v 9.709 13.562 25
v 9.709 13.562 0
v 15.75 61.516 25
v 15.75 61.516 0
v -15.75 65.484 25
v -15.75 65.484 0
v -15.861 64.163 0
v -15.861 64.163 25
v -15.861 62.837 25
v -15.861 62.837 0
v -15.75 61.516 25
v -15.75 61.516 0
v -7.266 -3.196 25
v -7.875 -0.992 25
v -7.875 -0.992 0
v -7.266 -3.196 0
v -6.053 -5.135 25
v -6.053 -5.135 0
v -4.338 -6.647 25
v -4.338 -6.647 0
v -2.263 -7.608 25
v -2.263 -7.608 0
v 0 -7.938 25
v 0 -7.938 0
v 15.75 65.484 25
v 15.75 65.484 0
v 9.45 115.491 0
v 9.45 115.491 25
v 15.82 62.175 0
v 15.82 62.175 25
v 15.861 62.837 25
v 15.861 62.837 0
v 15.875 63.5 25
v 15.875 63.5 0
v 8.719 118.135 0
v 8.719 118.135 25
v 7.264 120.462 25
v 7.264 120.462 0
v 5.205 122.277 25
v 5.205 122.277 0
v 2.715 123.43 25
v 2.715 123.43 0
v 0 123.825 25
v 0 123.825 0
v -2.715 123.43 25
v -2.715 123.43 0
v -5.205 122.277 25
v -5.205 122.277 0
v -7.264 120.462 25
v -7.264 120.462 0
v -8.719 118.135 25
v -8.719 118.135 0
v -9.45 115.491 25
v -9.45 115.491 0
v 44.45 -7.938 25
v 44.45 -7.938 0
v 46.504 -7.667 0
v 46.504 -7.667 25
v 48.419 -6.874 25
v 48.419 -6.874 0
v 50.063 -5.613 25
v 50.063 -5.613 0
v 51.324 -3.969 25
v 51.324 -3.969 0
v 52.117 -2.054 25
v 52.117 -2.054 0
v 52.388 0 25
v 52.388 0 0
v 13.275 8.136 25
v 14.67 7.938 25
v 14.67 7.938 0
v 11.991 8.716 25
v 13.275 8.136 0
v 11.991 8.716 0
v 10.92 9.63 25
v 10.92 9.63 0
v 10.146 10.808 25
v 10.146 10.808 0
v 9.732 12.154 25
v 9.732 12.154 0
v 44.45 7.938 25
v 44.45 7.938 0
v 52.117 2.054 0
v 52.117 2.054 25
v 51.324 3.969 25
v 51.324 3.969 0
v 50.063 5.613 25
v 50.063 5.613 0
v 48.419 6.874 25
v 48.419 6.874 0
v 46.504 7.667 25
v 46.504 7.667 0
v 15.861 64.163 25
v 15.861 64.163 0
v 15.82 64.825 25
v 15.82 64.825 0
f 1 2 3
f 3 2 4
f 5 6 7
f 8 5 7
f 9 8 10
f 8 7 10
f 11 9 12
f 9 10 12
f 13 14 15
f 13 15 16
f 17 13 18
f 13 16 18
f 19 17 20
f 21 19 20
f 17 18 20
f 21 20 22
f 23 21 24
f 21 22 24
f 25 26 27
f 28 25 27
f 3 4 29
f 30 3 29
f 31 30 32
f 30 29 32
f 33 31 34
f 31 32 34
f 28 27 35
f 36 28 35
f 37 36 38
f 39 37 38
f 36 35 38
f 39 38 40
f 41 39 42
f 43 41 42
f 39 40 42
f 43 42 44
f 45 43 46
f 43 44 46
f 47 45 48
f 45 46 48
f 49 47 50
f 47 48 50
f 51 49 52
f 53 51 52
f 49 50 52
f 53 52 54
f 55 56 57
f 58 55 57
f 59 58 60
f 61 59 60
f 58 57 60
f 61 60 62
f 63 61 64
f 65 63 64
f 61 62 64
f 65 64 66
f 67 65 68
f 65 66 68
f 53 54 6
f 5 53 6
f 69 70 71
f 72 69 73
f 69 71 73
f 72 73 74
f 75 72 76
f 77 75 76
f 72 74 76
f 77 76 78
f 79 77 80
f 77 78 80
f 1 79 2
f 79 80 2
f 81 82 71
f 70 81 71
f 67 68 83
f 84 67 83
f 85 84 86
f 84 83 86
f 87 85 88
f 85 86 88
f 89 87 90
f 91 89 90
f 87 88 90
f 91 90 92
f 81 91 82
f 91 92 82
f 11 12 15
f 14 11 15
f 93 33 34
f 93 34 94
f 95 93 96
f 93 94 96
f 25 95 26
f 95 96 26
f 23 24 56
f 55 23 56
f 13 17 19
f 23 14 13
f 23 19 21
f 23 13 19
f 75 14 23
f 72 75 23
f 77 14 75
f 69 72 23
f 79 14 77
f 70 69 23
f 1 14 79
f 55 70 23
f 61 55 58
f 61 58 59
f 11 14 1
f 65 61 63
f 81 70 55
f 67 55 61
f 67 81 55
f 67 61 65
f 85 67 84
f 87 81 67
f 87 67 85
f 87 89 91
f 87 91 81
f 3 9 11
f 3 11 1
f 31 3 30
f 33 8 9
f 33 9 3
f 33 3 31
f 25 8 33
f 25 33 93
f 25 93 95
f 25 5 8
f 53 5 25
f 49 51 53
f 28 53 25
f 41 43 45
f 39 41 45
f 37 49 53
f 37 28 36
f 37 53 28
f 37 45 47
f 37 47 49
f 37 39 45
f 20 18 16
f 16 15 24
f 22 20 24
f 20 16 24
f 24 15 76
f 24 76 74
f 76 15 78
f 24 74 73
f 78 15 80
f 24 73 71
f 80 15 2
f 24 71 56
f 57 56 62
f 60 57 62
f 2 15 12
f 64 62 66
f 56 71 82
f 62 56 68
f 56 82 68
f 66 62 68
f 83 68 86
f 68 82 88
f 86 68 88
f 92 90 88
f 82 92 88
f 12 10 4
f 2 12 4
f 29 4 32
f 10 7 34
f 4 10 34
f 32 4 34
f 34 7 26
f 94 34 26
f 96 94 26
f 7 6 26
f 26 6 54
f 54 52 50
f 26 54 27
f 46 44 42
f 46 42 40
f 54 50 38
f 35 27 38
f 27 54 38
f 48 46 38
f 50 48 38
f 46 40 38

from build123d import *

# Parameters (mm, degrees)
F1_DEPTH = 25


with BuildPart() as f1:
    # F0 (on Top) → F1 (new body)
    with BuildSketch(Plane.XY):
        with BuildLine():
            ThreePointArc((0, -7.9375), (5.6126600757, -5.6126600757), (7.9375, 0))
            ThreePointArc((7.9375, 0), (-0.4970693683, 7.9219207452), (-7.8752441368, -0.9921875))
            ThreePointArc((-7.8752441368, -0.9921875), (-5.2501627579, -5.953125), (0, -7.9375))
        make_face()
        with BuildLine():
            ThreePointArc((44.45, 7.9375), (36.5125, 0), (44.45, -7.9375))
            ThreePointArc((44.45, -7.9375), (50.0626600757, -5.6126600757), (52.3875, 0))
            ThreePointArc((52.3875, 0), (50.0626600757, 5.6126600757), (44.45, 7.9375))
        make_face()
        with BuildLine():
            ThreePointArc((-15.7504882737, 65.484375), (-15.875, 63.5), (-15.7504882737, 61.515625))
            ThreePointArc((-15.7504882737, 61.515625), (0, 47.625), (15.7504882737, 61.515625))
            ThreePointArc((15.7504882737, 61.515625), (15.8438414904, 62.5058612634), (15.875, 63.5))
            ThreePointArc((15.875, 63.5), (15.8438414904, 64.4941387366), (15.7504882737, 65.484375))
            ThreePointArc((15.7504882737, 65.484375), (0, 79.375), (-15.7504882737, 65.484375))
        make_face()
        with BuildLine():
            ThreePointArc((-7.8752441368, -0.9921875), (-0.4970693683, 7.9219207452), (7.9375, 0))
            ThreePointArc((7.9375, 0), (5.6126600757, -5.6126600757), (0, -7.9375))
            Line((0, -7.9375), (44.45, -7.9375))
            ThreePointArc((44.45, -7.9375), (36.5125, 0), (44.45, 7.9375))
            Line((44.45, 7.9375), (14.6697461087, 7.9375))
            ThreePointArc((14.6697461087, 7.9375), (10.9197461087, 9.6303108612), (9.7089624004, 13.5625))
            Line((9.7089624004, 13.5625), (15.7504882737, 61.515625))
            ThreePointArc((15.7504882737, 61.515625), (0, 47.625), (-15.7504882737, 61.515625))
            Line((-15.7504882737, 61.515625), (-7.8752441368, -0.9921875))
        make_face()
        with BuildLine():
            Line((-9.4502929642, 115.490625), (-15.7504882737, 65.484375))
            ThreePointArc((-15.7504882737, 65.484375), (0, 79.375), (15.7504882737, 65.484375))
            Line((15.7504882737, 65.484375), (9.4502929642, 115.490625))
            ThreePointArc((9.4502929642, 115.490625), (9.5063048942, 114.896483242), (9.525, 114.3))
            ThreePointArc((9.525, 114.3), (-0.596483242, 104.7936951058), (-9.4502929642, 115.490625))
        make_face()
        with BuildLine():
            ThreePointArc((9.4502929642, 115.490625), (0, 123.825), (-9.4502929642, 115.490625))
            ThreePointArc((-9.4502929642, 115.490625), (-0.596483242, 104.7936951058), (9.525, 114.3))
            ThreePointArc((9.525, 114.3), (9.5063048942, 114.896483242), (9.4502929642, 115.490625))
        make_face()
    extrude(amount=F1_DEPTH)


solid = f1.part
